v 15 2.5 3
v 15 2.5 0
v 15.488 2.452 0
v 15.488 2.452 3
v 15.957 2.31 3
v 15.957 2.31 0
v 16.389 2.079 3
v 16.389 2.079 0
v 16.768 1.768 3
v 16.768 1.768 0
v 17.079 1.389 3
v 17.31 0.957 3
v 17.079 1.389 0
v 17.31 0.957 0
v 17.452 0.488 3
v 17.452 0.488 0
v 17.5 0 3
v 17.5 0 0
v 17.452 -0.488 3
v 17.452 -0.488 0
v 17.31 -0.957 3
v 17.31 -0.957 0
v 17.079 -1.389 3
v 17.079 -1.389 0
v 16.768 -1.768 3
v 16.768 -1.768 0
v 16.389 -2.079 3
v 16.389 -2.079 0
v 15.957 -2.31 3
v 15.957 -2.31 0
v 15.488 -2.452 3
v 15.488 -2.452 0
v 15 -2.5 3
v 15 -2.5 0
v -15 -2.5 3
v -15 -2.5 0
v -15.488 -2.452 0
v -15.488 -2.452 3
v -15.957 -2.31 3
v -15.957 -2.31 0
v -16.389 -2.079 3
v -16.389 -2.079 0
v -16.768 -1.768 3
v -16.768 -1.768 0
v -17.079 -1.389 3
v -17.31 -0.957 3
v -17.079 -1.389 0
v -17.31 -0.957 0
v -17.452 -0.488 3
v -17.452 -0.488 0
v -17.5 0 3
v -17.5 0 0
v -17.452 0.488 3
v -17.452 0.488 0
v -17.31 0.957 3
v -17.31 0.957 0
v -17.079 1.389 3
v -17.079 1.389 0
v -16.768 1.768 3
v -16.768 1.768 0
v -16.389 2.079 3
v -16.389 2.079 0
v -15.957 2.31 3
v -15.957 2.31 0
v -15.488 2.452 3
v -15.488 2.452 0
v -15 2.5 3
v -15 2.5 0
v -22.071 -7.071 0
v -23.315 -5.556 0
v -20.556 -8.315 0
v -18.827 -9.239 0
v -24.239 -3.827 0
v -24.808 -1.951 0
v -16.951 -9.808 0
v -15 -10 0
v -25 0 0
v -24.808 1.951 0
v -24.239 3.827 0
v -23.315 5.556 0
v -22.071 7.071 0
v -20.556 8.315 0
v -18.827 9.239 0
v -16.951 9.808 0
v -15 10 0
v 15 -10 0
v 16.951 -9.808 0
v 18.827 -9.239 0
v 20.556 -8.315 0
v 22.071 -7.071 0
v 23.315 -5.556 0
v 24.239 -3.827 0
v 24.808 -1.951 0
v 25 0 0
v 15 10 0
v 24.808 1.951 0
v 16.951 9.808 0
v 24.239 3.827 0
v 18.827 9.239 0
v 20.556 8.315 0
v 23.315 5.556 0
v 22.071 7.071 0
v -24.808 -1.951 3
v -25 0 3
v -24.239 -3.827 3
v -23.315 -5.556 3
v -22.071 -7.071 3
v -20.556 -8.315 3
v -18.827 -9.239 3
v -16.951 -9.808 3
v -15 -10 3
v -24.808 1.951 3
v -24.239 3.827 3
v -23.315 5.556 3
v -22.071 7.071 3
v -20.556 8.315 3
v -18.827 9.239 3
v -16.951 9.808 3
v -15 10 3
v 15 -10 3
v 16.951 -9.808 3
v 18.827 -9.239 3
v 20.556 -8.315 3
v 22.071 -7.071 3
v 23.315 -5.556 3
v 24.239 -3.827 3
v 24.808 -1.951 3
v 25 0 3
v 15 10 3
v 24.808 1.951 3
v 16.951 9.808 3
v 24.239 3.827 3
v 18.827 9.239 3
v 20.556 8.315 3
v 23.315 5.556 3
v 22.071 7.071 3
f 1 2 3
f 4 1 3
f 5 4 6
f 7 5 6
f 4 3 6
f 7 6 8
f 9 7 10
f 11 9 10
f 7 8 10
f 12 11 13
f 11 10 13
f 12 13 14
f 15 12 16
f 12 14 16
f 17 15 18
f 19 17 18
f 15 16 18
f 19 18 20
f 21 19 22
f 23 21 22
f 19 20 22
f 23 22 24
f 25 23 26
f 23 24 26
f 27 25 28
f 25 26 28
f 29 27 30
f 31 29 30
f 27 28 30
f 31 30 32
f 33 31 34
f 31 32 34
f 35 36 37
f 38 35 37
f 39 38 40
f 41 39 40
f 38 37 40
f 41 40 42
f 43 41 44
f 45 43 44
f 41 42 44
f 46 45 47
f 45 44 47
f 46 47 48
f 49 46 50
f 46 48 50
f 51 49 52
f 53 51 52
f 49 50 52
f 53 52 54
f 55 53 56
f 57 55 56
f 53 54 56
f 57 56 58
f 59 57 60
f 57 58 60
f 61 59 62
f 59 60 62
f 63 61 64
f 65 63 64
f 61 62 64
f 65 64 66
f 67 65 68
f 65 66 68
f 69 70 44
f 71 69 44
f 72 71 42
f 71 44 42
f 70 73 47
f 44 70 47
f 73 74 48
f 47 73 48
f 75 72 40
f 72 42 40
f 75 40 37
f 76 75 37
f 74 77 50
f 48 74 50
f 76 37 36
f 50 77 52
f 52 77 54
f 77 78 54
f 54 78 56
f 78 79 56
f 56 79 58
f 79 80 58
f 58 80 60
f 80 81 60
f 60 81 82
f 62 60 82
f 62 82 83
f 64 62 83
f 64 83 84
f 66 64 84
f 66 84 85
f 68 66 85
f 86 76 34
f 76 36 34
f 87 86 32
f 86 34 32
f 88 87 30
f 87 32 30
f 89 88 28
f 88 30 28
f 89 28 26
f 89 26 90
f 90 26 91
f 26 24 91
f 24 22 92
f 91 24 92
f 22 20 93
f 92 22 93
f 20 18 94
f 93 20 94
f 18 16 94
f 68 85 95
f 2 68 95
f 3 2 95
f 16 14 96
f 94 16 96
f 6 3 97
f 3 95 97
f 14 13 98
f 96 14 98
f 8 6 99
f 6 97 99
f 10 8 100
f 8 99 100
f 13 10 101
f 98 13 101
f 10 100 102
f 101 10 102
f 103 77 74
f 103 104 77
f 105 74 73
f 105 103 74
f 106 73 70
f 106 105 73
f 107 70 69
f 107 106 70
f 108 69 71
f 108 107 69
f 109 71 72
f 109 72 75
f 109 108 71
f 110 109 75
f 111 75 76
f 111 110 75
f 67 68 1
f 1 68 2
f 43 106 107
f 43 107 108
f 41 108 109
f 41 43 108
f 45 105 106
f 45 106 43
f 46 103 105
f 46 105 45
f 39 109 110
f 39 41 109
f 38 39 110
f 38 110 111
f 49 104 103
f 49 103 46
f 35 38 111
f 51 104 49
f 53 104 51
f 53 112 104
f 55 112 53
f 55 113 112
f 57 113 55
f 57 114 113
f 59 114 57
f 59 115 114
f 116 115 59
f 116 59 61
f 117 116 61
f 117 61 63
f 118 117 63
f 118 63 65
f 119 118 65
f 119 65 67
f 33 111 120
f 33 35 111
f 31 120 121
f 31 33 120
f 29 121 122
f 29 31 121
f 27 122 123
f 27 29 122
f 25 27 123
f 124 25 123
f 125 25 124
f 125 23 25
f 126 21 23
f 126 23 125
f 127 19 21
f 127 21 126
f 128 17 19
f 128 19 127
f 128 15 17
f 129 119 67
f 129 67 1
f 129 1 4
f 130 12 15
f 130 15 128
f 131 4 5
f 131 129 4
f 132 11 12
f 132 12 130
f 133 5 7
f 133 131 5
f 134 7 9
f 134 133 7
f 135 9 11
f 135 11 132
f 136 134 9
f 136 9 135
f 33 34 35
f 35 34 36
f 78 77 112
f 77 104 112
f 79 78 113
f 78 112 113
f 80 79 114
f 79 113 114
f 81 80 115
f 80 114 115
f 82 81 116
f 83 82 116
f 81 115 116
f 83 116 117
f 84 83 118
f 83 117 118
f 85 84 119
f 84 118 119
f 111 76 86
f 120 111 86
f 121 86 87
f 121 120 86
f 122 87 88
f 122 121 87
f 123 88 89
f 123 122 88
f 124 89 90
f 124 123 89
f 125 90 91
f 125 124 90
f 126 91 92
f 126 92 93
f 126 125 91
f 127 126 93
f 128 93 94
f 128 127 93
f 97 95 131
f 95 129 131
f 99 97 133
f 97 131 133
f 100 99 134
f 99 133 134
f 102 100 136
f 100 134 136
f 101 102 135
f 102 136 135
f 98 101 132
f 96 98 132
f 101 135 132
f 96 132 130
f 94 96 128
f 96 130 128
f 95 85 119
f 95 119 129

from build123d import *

# Parameters (mm, degrees)
SKETCH2_W           = 50
SKETCH2_H           = 20
BOSS_EXTRUDE1_DEPTH = 3
FILLET1_R           = 10


with BuildPart() as part:
    # Sketch2 → Boss-Extrude1 (new body)
    with BuildSketch(Plane.XY):
        Rectangle(SKETCH2_W, SKETCH2_H)
        with BuildLine():
            Line((-15, 2.5), (15, 2.5))
            ThreePointArc((15, 2.5), (17.5, 0), (15, -2.5))
            Line((15, -2.5), (-15, -2.5))
            ThreePointArc((-15, -2.5), (-17.5, 0), (-15, 2.5))
        make_face(mode=Mode.SUBTRACT)
    extrude(amount=BOSS_EXTRUDE1_DEPTH)

    # Fillet1
    fillet1_edges = [part.edges().sort_by_distance(p)[0] for p in [
        (25, -10, 1.5),
        (-25, -10, 1.5),
        (-25, 10, 1.5),
        (25, 10, 1.5),
    ]]
    fillet(fillet1_edges, radius=FILLET1_R - 0.0001)  # a hair under: the kernel refuses the full size


solid = part.part
